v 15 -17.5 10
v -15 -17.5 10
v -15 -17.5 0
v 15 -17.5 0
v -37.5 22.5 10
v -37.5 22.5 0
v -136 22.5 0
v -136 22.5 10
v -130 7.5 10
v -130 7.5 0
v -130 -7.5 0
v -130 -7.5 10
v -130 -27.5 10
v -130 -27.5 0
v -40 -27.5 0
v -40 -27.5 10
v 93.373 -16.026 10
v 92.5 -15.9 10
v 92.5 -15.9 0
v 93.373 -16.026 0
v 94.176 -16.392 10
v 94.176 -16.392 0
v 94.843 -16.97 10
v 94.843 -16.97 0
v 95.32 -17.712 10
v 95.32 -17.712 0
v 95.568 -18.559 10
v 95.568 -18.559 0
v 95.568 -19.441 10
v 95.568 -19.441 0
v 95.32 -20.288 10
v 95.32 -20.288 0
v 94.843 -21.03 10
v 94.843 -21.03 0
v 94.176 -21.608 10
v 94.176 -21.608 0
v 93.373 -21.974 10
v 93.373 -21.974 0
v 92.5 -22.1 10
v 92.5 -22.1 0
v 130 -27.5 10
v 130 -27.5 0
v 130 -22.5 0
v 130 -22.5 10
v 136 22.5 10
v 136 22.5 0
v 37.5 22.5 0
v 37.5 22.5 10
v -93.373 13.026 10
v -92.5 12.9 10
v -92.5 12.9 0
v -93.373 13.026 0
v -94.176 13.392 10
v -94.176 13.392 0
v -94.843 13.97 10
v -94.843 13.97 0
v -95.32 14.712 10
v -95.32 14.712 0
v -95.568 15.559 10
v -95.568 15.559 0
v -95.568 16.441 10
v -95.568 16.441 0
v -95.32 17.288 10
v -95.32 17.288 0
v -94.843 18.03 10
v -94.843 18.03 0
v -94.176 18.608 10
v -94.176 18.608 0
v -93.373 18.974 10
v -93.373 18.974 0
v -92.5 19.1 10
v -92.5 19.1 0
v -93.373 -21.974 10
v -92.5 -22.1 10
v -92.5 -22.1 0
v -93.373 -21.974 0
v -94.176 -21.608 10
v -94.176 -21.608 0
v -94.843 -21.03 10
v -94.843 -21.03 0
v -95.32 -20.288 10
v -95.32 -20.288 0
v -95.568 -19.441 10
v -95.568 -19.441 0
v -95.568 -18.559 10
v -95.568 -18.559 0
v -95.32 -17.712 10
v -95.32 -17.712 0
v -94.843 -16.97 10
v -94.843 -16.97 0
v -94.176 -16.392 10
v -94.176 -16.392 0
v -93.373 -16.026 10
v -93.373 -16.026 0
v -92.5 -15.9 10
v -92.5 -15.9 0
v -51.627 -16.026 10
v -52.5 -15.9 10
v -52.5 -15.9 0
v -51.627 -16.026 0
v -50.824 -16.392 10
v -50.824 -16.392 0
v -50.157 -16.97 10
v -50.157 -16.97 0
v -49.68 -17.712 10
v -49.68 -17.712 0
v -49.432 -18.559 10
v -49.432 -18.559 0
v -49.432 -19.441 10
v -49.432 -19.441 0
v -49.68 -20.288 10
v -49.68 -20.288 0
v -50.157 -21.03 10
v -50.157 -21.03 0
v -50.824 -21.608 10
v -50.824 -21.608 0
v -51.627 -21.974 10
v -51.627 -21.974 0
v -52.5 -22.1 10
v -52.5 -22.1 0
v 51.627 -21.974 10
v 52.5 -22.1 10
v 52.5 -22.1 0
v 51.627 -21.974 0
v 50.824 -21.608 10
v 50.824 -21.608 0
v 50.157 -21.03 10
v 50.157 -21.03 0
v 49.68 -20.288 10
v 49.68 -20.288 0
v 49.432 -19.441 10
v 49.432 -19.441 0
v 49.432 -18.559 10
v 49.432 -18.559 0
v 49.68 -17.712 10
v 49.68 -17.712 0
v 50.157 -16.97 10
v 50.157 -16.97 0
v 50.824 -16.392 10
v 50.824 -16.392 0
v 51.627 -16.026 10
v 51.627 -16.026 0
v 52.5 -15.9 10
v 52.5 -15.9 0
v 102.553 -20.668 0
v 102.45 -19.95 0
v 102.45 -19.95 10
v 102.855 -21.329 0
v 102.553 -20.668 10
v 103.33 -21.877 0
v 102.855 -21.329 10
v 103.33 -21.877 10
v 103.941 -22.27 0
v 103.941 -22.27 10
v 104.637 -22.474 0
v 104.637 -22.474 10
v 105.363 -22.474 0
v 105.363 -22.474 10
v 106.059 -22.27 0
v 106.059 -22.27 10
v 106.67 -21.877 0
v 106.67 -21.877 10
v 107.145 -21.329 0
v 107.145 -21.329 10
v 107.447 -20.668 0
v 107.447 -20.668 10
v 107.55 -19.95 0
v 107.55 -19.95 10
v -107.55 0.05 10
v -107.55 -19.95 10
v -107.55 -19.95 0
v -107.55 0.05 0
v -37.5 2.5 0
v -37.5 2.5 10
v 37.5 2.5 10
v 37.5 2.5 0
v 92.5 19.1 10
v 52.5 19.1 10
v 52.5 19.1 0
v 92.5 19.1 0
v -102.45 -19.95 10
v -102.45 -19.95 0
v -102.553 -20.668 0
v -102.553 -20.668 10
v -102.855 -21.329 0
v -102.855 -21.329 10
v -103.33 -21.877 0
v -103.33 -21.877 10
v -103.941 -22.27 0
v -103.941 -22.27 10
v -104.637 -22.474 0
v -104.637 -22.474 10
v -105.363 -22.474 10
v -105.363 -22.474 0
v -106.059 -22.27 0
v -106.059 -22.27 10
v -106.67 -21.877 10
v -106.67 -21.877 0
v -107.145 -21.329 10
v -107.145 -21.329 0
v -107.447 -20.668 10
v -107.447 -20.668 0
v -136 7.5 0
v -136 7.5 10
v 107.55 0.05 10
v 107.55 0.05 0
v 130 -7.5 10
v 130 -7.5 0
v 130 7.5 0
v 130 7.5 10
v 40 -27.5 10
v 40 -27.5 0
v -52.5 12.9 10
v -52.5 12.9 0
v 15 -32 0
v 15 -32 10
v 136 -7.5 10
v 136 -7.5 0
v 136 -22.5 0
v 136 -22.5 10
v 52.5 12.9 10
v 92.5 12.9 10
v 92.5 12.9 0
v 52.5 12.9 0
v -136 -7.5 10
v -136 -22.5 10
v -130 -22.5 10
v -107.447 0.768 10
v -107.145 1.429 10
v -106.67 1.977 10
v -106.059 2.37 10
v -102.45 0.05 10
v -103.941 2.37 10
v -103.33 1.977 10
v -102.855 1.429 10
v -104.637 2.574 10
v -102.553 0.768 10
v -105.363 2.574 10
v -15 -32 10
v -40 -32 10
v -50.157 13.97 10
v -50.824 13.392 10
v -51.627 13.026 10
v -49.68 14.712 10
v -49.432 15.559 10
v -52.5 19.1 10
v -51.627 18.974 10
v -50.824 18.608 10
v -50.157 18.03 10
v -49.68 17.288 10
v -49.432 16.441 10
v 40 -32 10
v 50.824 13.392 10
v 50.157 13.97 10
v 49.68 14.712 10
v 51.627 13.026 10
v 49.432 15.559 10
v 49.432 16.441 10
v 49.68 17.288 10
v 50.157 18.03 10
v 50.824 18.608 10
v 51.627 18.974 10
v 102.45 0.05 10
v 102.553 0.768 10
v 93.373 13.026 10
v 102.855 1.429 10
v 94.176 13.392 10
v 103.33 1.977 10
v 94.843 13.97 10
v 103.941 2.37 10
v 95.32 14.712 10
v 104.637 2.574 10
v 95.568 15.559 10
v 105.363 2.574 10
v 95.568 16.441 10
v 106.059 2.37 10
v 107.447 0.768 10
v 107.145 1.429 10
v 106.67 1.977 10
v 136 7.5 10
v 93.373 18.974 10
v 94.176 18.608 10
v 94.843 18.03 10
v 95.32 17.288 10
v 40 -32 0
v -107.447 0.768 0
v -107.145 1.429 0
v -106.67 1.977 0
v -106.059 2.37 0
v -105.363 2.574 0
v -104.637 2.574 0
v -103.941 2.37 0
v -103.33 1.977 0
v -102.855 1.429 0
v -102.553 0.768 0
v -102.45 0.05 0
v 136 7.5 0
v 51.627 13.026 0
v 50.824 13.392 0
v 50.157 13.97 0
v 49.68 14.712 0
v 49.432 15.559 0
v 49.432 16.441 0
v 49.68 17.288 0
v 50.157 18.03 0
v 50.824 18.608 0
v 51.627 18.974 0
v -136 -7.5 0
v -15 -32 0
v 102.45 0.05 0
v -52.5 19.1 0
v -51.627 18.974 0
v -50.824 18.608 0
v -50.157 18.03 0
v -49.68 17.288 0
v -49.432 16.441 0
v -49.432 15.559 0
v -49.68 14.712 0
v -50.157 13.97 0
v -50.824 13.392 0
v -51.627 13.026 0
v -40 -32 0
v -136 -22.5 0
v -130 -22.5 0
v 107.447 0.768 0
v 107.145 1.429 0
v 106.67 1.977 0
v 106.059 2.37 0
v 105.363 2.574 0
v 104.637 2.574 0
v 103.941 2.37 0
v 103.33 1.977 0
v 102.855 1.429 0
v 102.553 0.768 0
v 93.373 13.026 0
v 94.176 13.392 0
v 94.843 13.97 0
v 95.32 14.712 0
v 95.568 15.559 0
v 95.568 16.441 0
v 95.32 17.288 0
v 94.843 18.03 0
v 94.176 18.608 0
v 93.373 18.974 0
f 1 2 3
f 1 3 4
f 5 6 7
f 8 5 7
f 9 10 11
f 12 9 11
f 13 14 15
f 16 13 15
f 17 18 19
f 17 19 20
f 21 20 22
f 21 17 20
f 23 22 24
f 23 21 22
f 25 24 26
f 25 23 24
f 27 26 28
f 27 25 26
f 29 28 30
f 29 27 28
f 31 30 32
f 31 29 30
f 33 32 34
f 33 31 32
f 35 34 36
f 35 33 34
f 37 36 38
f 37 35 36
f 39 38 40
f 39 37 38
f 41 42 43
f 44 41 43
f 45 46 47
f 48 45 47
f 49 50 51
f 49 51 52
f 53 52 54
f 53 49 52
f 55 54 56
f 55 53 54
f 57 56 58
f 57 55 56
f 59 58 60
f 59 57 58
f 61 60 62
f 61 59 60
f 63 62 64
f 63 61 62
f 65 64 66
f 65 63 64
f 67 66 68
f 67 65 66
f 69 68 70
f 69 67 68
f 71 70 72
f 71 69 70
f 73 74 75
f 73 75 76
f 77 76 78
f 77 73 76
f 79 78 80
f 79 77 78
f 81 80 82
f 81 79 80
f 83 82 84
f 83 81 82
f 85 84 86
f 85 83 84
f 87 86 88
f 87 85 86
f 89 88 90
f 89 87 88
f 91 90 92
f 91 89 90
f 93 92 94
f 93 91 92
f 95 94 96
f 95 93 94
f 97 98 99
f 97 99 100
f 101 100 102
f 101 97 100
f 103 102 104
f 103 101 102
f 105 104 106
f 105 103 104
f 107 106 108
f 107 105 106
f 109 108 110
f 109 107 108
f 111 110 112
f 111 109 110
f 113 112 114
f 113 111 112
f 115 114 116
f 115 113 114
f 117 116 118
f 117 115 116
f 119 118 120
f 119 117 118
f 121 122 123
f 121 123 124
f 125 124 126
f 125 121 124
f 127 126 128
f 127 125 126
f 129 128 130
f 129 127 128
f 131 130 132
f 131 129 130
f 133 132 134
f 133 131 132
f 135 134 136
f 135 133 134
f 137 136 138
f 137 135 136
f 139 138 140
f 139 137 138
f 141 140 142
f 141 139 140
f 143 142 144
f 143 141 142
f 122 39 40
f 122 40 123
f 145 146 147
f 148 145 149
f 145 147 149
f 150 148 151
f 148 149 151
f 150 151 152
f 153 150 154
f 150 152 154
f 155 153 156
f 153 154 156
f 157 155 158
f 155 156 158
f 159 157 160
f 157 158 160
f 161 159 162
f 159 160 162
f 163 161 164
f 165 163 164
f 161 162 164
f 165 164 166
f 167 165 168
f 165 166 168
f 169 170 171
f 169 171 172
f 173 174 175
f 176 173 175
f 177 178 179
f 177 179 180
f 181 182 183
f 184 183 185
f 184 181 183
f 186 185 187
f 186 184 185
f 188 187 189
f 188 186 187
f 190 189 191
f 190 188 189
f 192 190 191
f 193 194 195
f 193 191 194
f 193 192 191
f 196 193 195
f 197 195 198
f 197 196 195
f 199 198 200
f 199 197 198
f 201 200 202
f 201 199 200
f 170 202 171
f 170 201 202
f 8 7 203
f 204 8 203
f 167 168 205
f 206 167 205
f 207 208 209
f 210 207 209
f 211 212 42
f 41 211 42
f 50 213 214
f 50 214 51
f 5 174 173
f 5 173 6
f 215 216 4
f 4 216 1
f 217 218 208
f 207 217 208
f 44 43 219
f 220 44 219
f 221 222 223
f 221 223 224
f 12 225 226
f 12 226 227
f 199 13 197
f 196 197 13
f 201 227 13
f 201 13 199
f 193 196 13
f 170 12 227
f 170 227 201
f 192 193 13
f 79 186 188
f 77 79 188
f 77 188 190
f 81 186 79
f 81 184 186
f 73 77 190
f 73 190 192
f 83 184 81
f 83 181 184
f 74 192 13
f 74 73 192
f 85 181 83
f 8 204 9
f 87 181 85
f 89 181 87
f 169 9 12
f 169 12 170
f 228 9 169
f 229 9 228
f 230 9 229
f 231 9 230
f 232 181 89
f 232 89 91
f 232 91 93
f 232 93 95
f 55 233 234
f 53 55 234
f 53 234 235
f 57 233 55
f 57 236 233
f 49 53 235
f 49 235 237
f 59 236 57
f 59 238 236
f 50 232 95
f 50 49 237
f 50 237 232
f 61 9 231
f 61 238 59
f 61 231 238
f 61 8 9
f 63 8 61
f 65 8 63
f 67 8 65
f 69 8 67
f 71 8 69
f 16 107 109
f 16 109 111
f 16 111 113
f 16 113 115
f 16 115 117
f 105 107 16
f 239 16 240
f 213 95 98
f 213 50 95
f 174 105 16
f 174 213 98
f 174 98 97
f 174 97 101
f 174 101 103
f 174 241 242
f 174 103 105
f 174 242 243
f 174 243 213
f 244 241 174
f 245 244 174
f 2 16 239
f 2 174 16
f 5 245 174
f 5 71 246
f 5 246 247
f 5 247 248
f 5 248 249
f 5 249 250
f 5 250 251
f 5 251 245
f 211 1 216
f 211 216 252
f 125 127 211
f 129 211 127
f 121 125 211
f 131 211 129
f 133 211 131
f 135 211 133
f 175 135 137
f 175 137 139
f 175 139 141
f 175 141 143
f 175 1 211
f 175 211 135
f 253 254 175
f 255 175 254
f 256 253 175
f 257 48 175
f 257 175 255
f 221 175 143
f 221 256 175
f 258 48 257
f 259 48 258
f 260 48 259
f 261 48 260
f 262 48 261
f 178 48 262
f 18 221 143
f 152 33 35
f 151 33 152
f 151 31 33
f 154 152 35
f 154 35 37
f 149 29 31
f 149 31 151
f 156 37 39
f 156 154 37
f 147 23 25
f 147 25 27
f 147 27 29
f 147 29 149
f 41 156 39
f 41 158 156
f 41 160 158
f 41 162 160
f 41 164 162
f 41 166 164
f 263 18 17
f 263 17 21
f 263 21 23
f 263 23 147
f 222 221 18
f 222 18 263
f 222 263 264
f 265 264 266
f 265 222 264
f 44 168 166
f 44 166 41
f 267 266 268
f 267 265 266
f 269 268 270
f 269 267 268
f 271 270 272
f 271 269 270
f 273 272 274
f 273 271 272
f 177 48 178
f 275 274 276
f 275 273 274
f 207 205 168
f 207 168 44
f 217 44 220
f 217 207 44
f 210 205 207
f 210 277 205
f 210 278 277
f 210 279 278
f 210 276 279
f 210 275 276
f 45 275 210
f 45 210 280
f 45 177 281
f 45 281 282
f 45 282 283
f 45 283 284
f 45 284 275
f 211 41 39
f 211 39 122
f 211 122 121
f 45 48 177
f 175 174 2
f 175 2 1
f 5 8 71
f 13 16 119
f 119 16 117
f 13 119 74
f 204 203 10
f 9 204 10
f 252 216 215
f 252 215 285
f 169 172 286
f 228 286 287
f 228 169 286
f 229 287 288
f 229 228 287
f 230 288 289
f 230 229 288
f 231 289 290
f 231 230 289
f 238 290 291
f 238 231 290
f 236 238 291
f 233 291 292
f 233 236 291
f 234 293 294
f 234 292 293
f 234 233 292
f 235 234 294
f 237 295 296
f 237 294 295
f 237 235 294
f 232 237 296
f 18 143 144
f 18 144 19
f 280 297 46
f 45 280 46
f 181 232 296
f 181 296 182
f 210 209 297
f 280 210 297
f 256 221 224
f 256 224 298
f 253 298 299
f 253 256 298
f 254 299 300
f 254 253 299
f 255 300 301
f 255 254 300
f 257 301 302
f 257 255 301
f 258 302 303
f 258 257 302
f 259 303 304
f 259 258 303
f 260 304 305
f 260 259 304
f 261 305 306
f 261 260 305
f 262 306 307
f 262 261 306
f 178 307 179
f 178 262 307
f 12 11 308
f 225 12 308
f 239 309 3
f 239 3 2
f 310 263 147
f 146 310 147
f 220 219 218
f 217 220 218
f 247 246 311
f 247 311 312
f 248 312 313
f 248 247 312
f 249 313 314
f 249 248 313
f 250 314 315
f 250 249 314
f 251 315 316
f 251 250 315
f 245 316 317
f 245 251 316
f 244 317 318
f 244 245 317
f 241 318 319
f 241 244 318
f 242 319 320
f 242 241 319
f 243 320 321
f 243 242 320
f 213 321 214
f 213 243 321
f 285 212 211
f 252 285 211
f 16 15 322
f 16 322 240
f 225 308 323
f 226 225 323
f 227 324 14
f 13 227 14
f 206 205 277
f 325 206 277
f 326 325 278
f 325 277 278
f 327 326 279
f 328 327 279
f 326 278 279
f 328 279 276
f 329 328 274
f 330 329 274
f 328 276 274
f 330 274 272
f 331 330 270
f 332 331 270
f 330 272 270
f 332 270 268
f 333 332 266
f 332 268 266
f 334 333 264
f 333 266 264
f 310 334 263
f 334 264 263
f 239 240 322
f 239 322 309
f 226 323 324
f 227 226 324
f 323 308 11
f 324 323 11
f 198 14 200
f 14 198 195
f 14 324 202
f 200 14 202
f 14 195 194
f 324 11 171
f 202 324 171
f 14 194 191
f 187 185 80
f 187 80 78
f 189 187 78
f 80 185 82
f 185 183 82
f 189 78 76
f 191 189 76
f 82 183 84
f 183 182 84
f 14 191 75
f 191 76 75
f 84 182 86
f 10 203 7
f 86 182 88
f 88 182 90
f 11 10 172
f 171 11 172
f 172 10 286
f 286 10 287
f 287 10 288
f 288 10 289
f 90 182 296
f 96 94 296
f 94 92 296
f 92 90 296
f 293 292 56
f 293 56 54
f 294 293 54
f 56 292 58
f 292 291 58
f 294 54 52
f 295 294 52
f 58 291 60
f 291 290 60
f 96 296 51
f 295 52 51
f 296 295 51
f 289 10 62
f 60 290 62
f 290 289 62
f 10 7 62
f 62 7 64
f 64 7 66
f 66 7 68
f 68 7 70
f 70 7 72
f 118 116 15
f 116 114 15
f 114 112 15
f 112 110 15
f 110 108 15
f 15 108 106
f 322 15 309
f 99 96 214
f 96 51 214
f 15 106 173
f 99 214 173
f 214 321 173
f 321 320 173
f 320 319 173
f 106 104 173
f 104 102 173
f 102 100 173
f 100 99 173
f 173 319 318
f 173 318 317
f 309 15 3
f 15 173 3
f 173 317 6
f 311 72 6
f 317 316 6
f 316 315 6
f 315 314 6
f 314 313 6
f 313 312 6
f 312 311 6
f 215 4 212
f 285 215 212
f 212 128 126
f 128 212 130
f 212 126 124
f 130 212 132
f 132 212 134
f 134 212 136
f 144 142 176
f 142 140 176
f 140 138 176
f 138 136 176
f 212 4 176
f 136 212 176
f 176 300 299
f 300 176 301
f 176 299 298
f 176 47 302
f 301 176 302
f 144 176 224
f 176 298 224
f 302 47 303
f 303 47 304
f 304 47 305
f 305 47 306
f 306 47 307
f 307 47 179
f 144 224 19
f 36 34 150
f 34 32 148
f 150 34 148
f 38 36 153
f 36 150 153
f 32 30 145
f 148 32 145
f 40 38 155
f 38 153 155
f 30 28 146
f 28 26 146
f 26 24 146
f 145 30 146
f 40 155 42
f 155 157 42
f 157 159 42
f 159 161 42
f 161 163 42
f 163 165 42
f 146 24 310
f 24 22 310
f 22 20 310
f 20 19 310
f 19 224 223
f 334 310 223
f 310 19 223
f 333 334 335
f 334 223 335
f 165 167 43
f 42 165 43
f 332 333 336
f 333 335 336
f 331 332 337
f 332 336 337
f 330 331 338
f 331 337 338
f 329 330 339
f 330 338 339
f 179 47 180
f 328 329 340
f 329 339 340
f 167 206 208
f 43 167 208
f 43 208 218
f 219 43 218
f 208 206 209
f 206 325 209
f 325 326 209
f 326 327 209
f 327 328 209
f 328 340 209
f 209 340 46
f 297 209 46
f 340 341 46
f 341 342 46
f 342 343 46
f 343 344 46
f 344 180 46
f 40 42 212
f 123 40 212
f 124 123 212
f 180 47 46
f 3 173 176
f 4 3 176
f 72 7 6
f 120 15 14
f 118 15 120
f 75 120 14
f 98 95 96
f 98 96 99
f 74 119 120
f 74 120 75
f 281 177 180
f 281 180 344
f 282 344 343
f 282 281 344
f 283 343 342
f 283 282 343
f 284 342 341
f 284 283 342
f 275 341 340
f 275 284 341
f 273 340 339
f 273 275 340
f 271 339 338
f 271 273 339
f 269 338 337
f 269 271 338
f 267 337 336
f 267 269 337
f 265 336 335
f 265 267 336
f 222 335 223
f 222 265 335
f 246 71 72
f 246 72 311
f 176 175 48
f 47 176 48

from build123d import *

# Parameters (mm, degrees)
EXTRUDE_1_DEPTH     = 10
CUT_EXTRUDE_1_DEPTH = 140.112364655
SKETCH_3_W          = 30
SKETCH_3_H          = 10
SKETCH_3_W_2        = 75
SKETCH_3_H_2        = 20
CUT_EXTRUDE_2_DEPTH = 140.112364655
SKETCH_4_W          = 25
SKETCH_4_H          = 10
EXTRUDE_2_DEPTH     = 4.5


with BuildPart() as part:
    # 草圖1 → 填料-伸長1 (new body)
    with BuildSketch(Plane.XY):
        Polygon((136, -22.5), (136, -7.5), (130, -7.5), (130, 7.5), (136, 7.5), (136, 22.5), (-136, 22.5), (-136, 7.5), (-130, 7.5), (-130, -7.5), (-136, -7.5), (-136, -22.5), (-130, -22.5), (-130, -27.5), (130, -27.5), (130, -22.5), align=None)
    extrude(amount=EXTRUDE_1_DEPTH)

    # 草圖2 → 除料-伸長1 (cut, through all)
    with BuildSketch(Plane.XY.offset(10)):
        with BuildLine():
            Line((-92.5, 19.1), (-52.5, 19.1))
            ThreePointArc((-52.5, 19.1), (-49.4, 16), (-52.5, 12.9))
            Line((-52.5, 12.9), (-92.5, 12.9))
            ThreePointArc((-92.5, 12.9), (-95.6, 16), (-92.5, 19.1))
        make_face()
        with BuildLine():
            Line((-92.5, -15.9), (-52.5, -15.9))
            ThreePointArc((-52.5, -15.9), (-49.4, -19), (-52.5, -22.1))
            Line((-52.5, -22.1), (-92.5, -22.1))
            ThreePointArc((-92.5, -22.1), (-95.6, -19), (-92.5, -15.9))
        make_face()
        with BuildLine():
            Line((52.5, 19.1), (92.5, 19.1))
            ThreePointArc((92.5, 19.1), (95.6, 16), (92.5, 12.9))
            Line((92.5, 12.9), (52.5, 12.9))
            ThreePointArc((52.5, 12.9), (49.4, 16), (52.5, 19.1))
        make_face()
        with BuildLine():
            Line((52.5, -15.9), (92.5, -15.9))
            ThreePointArc((92.5, -15.9), (95.6, -19), (92.5, -22.1))
            Line((92.5, -22.1), (52.5, -22.1))
            ThreePointArc((52.5, -22.1), (49.4, -19), (52.5, -15.9))
        make_face()
    extrude(amount=-CUT_EXTRUDE_1_DEPTH, mode=Mode.SUBTRACT)

    # 草圖3 → 除料-伸長2 (cut, through all)
    with BuildSketch(Plane.XY.offset(10)):
        with Locations((0, -22.5)):
            Rectangle(SKETCH_3_W, SKETCH_3_H)
        with Locations((0, 12.5)):
            Rectangle(SKETCH_3_W_2, SKETCH_3_H_2)
        with BuildLine():
            Line((-102.45, 0.05), (-102.45, -19.95))
            ThreePointArc((-102.45, -19.95), (-105, -22.5), (-107.55, -19.95))
            Line((-107.55, -19.95), (-107.55, 0.05))
            ThreePointArc((-107.55, 0.05), (-105, 2.6), (-102.45, 0.05))
        make_face()
        with BuildLine():
            Line((102.45, 0.05), (102.45, -19.95))
            ThreePointArc((102.45, -19.95), (105, -22.5), (107.55, -19.95))
            Line((107.55, -19.95), (107.55, 0.05))
            ThreePointArc((107.55, 0.05), (105, 2.6), (102.45, 0.05))
        make_face()
    extrude(amount=-CUT_EXTRUDE_2_DEPTH, mode=Mode.SUBTRACT)

    # 草圖4 → 填料-伸長2 (add)
    with BuildSketch(Plane.XZ.offset(27.5)):
        with Locations((-27.5, 5)):
            Rectangle(SKETCH_4_W, SKETCH_4_H)
        with Locations((27.5, 5)):
            Rectangle(SKETCH_4_W, SKETCH_4_H)
    extrude(amount=EXTRUDE_2_DEPTH)


solid = part.part
